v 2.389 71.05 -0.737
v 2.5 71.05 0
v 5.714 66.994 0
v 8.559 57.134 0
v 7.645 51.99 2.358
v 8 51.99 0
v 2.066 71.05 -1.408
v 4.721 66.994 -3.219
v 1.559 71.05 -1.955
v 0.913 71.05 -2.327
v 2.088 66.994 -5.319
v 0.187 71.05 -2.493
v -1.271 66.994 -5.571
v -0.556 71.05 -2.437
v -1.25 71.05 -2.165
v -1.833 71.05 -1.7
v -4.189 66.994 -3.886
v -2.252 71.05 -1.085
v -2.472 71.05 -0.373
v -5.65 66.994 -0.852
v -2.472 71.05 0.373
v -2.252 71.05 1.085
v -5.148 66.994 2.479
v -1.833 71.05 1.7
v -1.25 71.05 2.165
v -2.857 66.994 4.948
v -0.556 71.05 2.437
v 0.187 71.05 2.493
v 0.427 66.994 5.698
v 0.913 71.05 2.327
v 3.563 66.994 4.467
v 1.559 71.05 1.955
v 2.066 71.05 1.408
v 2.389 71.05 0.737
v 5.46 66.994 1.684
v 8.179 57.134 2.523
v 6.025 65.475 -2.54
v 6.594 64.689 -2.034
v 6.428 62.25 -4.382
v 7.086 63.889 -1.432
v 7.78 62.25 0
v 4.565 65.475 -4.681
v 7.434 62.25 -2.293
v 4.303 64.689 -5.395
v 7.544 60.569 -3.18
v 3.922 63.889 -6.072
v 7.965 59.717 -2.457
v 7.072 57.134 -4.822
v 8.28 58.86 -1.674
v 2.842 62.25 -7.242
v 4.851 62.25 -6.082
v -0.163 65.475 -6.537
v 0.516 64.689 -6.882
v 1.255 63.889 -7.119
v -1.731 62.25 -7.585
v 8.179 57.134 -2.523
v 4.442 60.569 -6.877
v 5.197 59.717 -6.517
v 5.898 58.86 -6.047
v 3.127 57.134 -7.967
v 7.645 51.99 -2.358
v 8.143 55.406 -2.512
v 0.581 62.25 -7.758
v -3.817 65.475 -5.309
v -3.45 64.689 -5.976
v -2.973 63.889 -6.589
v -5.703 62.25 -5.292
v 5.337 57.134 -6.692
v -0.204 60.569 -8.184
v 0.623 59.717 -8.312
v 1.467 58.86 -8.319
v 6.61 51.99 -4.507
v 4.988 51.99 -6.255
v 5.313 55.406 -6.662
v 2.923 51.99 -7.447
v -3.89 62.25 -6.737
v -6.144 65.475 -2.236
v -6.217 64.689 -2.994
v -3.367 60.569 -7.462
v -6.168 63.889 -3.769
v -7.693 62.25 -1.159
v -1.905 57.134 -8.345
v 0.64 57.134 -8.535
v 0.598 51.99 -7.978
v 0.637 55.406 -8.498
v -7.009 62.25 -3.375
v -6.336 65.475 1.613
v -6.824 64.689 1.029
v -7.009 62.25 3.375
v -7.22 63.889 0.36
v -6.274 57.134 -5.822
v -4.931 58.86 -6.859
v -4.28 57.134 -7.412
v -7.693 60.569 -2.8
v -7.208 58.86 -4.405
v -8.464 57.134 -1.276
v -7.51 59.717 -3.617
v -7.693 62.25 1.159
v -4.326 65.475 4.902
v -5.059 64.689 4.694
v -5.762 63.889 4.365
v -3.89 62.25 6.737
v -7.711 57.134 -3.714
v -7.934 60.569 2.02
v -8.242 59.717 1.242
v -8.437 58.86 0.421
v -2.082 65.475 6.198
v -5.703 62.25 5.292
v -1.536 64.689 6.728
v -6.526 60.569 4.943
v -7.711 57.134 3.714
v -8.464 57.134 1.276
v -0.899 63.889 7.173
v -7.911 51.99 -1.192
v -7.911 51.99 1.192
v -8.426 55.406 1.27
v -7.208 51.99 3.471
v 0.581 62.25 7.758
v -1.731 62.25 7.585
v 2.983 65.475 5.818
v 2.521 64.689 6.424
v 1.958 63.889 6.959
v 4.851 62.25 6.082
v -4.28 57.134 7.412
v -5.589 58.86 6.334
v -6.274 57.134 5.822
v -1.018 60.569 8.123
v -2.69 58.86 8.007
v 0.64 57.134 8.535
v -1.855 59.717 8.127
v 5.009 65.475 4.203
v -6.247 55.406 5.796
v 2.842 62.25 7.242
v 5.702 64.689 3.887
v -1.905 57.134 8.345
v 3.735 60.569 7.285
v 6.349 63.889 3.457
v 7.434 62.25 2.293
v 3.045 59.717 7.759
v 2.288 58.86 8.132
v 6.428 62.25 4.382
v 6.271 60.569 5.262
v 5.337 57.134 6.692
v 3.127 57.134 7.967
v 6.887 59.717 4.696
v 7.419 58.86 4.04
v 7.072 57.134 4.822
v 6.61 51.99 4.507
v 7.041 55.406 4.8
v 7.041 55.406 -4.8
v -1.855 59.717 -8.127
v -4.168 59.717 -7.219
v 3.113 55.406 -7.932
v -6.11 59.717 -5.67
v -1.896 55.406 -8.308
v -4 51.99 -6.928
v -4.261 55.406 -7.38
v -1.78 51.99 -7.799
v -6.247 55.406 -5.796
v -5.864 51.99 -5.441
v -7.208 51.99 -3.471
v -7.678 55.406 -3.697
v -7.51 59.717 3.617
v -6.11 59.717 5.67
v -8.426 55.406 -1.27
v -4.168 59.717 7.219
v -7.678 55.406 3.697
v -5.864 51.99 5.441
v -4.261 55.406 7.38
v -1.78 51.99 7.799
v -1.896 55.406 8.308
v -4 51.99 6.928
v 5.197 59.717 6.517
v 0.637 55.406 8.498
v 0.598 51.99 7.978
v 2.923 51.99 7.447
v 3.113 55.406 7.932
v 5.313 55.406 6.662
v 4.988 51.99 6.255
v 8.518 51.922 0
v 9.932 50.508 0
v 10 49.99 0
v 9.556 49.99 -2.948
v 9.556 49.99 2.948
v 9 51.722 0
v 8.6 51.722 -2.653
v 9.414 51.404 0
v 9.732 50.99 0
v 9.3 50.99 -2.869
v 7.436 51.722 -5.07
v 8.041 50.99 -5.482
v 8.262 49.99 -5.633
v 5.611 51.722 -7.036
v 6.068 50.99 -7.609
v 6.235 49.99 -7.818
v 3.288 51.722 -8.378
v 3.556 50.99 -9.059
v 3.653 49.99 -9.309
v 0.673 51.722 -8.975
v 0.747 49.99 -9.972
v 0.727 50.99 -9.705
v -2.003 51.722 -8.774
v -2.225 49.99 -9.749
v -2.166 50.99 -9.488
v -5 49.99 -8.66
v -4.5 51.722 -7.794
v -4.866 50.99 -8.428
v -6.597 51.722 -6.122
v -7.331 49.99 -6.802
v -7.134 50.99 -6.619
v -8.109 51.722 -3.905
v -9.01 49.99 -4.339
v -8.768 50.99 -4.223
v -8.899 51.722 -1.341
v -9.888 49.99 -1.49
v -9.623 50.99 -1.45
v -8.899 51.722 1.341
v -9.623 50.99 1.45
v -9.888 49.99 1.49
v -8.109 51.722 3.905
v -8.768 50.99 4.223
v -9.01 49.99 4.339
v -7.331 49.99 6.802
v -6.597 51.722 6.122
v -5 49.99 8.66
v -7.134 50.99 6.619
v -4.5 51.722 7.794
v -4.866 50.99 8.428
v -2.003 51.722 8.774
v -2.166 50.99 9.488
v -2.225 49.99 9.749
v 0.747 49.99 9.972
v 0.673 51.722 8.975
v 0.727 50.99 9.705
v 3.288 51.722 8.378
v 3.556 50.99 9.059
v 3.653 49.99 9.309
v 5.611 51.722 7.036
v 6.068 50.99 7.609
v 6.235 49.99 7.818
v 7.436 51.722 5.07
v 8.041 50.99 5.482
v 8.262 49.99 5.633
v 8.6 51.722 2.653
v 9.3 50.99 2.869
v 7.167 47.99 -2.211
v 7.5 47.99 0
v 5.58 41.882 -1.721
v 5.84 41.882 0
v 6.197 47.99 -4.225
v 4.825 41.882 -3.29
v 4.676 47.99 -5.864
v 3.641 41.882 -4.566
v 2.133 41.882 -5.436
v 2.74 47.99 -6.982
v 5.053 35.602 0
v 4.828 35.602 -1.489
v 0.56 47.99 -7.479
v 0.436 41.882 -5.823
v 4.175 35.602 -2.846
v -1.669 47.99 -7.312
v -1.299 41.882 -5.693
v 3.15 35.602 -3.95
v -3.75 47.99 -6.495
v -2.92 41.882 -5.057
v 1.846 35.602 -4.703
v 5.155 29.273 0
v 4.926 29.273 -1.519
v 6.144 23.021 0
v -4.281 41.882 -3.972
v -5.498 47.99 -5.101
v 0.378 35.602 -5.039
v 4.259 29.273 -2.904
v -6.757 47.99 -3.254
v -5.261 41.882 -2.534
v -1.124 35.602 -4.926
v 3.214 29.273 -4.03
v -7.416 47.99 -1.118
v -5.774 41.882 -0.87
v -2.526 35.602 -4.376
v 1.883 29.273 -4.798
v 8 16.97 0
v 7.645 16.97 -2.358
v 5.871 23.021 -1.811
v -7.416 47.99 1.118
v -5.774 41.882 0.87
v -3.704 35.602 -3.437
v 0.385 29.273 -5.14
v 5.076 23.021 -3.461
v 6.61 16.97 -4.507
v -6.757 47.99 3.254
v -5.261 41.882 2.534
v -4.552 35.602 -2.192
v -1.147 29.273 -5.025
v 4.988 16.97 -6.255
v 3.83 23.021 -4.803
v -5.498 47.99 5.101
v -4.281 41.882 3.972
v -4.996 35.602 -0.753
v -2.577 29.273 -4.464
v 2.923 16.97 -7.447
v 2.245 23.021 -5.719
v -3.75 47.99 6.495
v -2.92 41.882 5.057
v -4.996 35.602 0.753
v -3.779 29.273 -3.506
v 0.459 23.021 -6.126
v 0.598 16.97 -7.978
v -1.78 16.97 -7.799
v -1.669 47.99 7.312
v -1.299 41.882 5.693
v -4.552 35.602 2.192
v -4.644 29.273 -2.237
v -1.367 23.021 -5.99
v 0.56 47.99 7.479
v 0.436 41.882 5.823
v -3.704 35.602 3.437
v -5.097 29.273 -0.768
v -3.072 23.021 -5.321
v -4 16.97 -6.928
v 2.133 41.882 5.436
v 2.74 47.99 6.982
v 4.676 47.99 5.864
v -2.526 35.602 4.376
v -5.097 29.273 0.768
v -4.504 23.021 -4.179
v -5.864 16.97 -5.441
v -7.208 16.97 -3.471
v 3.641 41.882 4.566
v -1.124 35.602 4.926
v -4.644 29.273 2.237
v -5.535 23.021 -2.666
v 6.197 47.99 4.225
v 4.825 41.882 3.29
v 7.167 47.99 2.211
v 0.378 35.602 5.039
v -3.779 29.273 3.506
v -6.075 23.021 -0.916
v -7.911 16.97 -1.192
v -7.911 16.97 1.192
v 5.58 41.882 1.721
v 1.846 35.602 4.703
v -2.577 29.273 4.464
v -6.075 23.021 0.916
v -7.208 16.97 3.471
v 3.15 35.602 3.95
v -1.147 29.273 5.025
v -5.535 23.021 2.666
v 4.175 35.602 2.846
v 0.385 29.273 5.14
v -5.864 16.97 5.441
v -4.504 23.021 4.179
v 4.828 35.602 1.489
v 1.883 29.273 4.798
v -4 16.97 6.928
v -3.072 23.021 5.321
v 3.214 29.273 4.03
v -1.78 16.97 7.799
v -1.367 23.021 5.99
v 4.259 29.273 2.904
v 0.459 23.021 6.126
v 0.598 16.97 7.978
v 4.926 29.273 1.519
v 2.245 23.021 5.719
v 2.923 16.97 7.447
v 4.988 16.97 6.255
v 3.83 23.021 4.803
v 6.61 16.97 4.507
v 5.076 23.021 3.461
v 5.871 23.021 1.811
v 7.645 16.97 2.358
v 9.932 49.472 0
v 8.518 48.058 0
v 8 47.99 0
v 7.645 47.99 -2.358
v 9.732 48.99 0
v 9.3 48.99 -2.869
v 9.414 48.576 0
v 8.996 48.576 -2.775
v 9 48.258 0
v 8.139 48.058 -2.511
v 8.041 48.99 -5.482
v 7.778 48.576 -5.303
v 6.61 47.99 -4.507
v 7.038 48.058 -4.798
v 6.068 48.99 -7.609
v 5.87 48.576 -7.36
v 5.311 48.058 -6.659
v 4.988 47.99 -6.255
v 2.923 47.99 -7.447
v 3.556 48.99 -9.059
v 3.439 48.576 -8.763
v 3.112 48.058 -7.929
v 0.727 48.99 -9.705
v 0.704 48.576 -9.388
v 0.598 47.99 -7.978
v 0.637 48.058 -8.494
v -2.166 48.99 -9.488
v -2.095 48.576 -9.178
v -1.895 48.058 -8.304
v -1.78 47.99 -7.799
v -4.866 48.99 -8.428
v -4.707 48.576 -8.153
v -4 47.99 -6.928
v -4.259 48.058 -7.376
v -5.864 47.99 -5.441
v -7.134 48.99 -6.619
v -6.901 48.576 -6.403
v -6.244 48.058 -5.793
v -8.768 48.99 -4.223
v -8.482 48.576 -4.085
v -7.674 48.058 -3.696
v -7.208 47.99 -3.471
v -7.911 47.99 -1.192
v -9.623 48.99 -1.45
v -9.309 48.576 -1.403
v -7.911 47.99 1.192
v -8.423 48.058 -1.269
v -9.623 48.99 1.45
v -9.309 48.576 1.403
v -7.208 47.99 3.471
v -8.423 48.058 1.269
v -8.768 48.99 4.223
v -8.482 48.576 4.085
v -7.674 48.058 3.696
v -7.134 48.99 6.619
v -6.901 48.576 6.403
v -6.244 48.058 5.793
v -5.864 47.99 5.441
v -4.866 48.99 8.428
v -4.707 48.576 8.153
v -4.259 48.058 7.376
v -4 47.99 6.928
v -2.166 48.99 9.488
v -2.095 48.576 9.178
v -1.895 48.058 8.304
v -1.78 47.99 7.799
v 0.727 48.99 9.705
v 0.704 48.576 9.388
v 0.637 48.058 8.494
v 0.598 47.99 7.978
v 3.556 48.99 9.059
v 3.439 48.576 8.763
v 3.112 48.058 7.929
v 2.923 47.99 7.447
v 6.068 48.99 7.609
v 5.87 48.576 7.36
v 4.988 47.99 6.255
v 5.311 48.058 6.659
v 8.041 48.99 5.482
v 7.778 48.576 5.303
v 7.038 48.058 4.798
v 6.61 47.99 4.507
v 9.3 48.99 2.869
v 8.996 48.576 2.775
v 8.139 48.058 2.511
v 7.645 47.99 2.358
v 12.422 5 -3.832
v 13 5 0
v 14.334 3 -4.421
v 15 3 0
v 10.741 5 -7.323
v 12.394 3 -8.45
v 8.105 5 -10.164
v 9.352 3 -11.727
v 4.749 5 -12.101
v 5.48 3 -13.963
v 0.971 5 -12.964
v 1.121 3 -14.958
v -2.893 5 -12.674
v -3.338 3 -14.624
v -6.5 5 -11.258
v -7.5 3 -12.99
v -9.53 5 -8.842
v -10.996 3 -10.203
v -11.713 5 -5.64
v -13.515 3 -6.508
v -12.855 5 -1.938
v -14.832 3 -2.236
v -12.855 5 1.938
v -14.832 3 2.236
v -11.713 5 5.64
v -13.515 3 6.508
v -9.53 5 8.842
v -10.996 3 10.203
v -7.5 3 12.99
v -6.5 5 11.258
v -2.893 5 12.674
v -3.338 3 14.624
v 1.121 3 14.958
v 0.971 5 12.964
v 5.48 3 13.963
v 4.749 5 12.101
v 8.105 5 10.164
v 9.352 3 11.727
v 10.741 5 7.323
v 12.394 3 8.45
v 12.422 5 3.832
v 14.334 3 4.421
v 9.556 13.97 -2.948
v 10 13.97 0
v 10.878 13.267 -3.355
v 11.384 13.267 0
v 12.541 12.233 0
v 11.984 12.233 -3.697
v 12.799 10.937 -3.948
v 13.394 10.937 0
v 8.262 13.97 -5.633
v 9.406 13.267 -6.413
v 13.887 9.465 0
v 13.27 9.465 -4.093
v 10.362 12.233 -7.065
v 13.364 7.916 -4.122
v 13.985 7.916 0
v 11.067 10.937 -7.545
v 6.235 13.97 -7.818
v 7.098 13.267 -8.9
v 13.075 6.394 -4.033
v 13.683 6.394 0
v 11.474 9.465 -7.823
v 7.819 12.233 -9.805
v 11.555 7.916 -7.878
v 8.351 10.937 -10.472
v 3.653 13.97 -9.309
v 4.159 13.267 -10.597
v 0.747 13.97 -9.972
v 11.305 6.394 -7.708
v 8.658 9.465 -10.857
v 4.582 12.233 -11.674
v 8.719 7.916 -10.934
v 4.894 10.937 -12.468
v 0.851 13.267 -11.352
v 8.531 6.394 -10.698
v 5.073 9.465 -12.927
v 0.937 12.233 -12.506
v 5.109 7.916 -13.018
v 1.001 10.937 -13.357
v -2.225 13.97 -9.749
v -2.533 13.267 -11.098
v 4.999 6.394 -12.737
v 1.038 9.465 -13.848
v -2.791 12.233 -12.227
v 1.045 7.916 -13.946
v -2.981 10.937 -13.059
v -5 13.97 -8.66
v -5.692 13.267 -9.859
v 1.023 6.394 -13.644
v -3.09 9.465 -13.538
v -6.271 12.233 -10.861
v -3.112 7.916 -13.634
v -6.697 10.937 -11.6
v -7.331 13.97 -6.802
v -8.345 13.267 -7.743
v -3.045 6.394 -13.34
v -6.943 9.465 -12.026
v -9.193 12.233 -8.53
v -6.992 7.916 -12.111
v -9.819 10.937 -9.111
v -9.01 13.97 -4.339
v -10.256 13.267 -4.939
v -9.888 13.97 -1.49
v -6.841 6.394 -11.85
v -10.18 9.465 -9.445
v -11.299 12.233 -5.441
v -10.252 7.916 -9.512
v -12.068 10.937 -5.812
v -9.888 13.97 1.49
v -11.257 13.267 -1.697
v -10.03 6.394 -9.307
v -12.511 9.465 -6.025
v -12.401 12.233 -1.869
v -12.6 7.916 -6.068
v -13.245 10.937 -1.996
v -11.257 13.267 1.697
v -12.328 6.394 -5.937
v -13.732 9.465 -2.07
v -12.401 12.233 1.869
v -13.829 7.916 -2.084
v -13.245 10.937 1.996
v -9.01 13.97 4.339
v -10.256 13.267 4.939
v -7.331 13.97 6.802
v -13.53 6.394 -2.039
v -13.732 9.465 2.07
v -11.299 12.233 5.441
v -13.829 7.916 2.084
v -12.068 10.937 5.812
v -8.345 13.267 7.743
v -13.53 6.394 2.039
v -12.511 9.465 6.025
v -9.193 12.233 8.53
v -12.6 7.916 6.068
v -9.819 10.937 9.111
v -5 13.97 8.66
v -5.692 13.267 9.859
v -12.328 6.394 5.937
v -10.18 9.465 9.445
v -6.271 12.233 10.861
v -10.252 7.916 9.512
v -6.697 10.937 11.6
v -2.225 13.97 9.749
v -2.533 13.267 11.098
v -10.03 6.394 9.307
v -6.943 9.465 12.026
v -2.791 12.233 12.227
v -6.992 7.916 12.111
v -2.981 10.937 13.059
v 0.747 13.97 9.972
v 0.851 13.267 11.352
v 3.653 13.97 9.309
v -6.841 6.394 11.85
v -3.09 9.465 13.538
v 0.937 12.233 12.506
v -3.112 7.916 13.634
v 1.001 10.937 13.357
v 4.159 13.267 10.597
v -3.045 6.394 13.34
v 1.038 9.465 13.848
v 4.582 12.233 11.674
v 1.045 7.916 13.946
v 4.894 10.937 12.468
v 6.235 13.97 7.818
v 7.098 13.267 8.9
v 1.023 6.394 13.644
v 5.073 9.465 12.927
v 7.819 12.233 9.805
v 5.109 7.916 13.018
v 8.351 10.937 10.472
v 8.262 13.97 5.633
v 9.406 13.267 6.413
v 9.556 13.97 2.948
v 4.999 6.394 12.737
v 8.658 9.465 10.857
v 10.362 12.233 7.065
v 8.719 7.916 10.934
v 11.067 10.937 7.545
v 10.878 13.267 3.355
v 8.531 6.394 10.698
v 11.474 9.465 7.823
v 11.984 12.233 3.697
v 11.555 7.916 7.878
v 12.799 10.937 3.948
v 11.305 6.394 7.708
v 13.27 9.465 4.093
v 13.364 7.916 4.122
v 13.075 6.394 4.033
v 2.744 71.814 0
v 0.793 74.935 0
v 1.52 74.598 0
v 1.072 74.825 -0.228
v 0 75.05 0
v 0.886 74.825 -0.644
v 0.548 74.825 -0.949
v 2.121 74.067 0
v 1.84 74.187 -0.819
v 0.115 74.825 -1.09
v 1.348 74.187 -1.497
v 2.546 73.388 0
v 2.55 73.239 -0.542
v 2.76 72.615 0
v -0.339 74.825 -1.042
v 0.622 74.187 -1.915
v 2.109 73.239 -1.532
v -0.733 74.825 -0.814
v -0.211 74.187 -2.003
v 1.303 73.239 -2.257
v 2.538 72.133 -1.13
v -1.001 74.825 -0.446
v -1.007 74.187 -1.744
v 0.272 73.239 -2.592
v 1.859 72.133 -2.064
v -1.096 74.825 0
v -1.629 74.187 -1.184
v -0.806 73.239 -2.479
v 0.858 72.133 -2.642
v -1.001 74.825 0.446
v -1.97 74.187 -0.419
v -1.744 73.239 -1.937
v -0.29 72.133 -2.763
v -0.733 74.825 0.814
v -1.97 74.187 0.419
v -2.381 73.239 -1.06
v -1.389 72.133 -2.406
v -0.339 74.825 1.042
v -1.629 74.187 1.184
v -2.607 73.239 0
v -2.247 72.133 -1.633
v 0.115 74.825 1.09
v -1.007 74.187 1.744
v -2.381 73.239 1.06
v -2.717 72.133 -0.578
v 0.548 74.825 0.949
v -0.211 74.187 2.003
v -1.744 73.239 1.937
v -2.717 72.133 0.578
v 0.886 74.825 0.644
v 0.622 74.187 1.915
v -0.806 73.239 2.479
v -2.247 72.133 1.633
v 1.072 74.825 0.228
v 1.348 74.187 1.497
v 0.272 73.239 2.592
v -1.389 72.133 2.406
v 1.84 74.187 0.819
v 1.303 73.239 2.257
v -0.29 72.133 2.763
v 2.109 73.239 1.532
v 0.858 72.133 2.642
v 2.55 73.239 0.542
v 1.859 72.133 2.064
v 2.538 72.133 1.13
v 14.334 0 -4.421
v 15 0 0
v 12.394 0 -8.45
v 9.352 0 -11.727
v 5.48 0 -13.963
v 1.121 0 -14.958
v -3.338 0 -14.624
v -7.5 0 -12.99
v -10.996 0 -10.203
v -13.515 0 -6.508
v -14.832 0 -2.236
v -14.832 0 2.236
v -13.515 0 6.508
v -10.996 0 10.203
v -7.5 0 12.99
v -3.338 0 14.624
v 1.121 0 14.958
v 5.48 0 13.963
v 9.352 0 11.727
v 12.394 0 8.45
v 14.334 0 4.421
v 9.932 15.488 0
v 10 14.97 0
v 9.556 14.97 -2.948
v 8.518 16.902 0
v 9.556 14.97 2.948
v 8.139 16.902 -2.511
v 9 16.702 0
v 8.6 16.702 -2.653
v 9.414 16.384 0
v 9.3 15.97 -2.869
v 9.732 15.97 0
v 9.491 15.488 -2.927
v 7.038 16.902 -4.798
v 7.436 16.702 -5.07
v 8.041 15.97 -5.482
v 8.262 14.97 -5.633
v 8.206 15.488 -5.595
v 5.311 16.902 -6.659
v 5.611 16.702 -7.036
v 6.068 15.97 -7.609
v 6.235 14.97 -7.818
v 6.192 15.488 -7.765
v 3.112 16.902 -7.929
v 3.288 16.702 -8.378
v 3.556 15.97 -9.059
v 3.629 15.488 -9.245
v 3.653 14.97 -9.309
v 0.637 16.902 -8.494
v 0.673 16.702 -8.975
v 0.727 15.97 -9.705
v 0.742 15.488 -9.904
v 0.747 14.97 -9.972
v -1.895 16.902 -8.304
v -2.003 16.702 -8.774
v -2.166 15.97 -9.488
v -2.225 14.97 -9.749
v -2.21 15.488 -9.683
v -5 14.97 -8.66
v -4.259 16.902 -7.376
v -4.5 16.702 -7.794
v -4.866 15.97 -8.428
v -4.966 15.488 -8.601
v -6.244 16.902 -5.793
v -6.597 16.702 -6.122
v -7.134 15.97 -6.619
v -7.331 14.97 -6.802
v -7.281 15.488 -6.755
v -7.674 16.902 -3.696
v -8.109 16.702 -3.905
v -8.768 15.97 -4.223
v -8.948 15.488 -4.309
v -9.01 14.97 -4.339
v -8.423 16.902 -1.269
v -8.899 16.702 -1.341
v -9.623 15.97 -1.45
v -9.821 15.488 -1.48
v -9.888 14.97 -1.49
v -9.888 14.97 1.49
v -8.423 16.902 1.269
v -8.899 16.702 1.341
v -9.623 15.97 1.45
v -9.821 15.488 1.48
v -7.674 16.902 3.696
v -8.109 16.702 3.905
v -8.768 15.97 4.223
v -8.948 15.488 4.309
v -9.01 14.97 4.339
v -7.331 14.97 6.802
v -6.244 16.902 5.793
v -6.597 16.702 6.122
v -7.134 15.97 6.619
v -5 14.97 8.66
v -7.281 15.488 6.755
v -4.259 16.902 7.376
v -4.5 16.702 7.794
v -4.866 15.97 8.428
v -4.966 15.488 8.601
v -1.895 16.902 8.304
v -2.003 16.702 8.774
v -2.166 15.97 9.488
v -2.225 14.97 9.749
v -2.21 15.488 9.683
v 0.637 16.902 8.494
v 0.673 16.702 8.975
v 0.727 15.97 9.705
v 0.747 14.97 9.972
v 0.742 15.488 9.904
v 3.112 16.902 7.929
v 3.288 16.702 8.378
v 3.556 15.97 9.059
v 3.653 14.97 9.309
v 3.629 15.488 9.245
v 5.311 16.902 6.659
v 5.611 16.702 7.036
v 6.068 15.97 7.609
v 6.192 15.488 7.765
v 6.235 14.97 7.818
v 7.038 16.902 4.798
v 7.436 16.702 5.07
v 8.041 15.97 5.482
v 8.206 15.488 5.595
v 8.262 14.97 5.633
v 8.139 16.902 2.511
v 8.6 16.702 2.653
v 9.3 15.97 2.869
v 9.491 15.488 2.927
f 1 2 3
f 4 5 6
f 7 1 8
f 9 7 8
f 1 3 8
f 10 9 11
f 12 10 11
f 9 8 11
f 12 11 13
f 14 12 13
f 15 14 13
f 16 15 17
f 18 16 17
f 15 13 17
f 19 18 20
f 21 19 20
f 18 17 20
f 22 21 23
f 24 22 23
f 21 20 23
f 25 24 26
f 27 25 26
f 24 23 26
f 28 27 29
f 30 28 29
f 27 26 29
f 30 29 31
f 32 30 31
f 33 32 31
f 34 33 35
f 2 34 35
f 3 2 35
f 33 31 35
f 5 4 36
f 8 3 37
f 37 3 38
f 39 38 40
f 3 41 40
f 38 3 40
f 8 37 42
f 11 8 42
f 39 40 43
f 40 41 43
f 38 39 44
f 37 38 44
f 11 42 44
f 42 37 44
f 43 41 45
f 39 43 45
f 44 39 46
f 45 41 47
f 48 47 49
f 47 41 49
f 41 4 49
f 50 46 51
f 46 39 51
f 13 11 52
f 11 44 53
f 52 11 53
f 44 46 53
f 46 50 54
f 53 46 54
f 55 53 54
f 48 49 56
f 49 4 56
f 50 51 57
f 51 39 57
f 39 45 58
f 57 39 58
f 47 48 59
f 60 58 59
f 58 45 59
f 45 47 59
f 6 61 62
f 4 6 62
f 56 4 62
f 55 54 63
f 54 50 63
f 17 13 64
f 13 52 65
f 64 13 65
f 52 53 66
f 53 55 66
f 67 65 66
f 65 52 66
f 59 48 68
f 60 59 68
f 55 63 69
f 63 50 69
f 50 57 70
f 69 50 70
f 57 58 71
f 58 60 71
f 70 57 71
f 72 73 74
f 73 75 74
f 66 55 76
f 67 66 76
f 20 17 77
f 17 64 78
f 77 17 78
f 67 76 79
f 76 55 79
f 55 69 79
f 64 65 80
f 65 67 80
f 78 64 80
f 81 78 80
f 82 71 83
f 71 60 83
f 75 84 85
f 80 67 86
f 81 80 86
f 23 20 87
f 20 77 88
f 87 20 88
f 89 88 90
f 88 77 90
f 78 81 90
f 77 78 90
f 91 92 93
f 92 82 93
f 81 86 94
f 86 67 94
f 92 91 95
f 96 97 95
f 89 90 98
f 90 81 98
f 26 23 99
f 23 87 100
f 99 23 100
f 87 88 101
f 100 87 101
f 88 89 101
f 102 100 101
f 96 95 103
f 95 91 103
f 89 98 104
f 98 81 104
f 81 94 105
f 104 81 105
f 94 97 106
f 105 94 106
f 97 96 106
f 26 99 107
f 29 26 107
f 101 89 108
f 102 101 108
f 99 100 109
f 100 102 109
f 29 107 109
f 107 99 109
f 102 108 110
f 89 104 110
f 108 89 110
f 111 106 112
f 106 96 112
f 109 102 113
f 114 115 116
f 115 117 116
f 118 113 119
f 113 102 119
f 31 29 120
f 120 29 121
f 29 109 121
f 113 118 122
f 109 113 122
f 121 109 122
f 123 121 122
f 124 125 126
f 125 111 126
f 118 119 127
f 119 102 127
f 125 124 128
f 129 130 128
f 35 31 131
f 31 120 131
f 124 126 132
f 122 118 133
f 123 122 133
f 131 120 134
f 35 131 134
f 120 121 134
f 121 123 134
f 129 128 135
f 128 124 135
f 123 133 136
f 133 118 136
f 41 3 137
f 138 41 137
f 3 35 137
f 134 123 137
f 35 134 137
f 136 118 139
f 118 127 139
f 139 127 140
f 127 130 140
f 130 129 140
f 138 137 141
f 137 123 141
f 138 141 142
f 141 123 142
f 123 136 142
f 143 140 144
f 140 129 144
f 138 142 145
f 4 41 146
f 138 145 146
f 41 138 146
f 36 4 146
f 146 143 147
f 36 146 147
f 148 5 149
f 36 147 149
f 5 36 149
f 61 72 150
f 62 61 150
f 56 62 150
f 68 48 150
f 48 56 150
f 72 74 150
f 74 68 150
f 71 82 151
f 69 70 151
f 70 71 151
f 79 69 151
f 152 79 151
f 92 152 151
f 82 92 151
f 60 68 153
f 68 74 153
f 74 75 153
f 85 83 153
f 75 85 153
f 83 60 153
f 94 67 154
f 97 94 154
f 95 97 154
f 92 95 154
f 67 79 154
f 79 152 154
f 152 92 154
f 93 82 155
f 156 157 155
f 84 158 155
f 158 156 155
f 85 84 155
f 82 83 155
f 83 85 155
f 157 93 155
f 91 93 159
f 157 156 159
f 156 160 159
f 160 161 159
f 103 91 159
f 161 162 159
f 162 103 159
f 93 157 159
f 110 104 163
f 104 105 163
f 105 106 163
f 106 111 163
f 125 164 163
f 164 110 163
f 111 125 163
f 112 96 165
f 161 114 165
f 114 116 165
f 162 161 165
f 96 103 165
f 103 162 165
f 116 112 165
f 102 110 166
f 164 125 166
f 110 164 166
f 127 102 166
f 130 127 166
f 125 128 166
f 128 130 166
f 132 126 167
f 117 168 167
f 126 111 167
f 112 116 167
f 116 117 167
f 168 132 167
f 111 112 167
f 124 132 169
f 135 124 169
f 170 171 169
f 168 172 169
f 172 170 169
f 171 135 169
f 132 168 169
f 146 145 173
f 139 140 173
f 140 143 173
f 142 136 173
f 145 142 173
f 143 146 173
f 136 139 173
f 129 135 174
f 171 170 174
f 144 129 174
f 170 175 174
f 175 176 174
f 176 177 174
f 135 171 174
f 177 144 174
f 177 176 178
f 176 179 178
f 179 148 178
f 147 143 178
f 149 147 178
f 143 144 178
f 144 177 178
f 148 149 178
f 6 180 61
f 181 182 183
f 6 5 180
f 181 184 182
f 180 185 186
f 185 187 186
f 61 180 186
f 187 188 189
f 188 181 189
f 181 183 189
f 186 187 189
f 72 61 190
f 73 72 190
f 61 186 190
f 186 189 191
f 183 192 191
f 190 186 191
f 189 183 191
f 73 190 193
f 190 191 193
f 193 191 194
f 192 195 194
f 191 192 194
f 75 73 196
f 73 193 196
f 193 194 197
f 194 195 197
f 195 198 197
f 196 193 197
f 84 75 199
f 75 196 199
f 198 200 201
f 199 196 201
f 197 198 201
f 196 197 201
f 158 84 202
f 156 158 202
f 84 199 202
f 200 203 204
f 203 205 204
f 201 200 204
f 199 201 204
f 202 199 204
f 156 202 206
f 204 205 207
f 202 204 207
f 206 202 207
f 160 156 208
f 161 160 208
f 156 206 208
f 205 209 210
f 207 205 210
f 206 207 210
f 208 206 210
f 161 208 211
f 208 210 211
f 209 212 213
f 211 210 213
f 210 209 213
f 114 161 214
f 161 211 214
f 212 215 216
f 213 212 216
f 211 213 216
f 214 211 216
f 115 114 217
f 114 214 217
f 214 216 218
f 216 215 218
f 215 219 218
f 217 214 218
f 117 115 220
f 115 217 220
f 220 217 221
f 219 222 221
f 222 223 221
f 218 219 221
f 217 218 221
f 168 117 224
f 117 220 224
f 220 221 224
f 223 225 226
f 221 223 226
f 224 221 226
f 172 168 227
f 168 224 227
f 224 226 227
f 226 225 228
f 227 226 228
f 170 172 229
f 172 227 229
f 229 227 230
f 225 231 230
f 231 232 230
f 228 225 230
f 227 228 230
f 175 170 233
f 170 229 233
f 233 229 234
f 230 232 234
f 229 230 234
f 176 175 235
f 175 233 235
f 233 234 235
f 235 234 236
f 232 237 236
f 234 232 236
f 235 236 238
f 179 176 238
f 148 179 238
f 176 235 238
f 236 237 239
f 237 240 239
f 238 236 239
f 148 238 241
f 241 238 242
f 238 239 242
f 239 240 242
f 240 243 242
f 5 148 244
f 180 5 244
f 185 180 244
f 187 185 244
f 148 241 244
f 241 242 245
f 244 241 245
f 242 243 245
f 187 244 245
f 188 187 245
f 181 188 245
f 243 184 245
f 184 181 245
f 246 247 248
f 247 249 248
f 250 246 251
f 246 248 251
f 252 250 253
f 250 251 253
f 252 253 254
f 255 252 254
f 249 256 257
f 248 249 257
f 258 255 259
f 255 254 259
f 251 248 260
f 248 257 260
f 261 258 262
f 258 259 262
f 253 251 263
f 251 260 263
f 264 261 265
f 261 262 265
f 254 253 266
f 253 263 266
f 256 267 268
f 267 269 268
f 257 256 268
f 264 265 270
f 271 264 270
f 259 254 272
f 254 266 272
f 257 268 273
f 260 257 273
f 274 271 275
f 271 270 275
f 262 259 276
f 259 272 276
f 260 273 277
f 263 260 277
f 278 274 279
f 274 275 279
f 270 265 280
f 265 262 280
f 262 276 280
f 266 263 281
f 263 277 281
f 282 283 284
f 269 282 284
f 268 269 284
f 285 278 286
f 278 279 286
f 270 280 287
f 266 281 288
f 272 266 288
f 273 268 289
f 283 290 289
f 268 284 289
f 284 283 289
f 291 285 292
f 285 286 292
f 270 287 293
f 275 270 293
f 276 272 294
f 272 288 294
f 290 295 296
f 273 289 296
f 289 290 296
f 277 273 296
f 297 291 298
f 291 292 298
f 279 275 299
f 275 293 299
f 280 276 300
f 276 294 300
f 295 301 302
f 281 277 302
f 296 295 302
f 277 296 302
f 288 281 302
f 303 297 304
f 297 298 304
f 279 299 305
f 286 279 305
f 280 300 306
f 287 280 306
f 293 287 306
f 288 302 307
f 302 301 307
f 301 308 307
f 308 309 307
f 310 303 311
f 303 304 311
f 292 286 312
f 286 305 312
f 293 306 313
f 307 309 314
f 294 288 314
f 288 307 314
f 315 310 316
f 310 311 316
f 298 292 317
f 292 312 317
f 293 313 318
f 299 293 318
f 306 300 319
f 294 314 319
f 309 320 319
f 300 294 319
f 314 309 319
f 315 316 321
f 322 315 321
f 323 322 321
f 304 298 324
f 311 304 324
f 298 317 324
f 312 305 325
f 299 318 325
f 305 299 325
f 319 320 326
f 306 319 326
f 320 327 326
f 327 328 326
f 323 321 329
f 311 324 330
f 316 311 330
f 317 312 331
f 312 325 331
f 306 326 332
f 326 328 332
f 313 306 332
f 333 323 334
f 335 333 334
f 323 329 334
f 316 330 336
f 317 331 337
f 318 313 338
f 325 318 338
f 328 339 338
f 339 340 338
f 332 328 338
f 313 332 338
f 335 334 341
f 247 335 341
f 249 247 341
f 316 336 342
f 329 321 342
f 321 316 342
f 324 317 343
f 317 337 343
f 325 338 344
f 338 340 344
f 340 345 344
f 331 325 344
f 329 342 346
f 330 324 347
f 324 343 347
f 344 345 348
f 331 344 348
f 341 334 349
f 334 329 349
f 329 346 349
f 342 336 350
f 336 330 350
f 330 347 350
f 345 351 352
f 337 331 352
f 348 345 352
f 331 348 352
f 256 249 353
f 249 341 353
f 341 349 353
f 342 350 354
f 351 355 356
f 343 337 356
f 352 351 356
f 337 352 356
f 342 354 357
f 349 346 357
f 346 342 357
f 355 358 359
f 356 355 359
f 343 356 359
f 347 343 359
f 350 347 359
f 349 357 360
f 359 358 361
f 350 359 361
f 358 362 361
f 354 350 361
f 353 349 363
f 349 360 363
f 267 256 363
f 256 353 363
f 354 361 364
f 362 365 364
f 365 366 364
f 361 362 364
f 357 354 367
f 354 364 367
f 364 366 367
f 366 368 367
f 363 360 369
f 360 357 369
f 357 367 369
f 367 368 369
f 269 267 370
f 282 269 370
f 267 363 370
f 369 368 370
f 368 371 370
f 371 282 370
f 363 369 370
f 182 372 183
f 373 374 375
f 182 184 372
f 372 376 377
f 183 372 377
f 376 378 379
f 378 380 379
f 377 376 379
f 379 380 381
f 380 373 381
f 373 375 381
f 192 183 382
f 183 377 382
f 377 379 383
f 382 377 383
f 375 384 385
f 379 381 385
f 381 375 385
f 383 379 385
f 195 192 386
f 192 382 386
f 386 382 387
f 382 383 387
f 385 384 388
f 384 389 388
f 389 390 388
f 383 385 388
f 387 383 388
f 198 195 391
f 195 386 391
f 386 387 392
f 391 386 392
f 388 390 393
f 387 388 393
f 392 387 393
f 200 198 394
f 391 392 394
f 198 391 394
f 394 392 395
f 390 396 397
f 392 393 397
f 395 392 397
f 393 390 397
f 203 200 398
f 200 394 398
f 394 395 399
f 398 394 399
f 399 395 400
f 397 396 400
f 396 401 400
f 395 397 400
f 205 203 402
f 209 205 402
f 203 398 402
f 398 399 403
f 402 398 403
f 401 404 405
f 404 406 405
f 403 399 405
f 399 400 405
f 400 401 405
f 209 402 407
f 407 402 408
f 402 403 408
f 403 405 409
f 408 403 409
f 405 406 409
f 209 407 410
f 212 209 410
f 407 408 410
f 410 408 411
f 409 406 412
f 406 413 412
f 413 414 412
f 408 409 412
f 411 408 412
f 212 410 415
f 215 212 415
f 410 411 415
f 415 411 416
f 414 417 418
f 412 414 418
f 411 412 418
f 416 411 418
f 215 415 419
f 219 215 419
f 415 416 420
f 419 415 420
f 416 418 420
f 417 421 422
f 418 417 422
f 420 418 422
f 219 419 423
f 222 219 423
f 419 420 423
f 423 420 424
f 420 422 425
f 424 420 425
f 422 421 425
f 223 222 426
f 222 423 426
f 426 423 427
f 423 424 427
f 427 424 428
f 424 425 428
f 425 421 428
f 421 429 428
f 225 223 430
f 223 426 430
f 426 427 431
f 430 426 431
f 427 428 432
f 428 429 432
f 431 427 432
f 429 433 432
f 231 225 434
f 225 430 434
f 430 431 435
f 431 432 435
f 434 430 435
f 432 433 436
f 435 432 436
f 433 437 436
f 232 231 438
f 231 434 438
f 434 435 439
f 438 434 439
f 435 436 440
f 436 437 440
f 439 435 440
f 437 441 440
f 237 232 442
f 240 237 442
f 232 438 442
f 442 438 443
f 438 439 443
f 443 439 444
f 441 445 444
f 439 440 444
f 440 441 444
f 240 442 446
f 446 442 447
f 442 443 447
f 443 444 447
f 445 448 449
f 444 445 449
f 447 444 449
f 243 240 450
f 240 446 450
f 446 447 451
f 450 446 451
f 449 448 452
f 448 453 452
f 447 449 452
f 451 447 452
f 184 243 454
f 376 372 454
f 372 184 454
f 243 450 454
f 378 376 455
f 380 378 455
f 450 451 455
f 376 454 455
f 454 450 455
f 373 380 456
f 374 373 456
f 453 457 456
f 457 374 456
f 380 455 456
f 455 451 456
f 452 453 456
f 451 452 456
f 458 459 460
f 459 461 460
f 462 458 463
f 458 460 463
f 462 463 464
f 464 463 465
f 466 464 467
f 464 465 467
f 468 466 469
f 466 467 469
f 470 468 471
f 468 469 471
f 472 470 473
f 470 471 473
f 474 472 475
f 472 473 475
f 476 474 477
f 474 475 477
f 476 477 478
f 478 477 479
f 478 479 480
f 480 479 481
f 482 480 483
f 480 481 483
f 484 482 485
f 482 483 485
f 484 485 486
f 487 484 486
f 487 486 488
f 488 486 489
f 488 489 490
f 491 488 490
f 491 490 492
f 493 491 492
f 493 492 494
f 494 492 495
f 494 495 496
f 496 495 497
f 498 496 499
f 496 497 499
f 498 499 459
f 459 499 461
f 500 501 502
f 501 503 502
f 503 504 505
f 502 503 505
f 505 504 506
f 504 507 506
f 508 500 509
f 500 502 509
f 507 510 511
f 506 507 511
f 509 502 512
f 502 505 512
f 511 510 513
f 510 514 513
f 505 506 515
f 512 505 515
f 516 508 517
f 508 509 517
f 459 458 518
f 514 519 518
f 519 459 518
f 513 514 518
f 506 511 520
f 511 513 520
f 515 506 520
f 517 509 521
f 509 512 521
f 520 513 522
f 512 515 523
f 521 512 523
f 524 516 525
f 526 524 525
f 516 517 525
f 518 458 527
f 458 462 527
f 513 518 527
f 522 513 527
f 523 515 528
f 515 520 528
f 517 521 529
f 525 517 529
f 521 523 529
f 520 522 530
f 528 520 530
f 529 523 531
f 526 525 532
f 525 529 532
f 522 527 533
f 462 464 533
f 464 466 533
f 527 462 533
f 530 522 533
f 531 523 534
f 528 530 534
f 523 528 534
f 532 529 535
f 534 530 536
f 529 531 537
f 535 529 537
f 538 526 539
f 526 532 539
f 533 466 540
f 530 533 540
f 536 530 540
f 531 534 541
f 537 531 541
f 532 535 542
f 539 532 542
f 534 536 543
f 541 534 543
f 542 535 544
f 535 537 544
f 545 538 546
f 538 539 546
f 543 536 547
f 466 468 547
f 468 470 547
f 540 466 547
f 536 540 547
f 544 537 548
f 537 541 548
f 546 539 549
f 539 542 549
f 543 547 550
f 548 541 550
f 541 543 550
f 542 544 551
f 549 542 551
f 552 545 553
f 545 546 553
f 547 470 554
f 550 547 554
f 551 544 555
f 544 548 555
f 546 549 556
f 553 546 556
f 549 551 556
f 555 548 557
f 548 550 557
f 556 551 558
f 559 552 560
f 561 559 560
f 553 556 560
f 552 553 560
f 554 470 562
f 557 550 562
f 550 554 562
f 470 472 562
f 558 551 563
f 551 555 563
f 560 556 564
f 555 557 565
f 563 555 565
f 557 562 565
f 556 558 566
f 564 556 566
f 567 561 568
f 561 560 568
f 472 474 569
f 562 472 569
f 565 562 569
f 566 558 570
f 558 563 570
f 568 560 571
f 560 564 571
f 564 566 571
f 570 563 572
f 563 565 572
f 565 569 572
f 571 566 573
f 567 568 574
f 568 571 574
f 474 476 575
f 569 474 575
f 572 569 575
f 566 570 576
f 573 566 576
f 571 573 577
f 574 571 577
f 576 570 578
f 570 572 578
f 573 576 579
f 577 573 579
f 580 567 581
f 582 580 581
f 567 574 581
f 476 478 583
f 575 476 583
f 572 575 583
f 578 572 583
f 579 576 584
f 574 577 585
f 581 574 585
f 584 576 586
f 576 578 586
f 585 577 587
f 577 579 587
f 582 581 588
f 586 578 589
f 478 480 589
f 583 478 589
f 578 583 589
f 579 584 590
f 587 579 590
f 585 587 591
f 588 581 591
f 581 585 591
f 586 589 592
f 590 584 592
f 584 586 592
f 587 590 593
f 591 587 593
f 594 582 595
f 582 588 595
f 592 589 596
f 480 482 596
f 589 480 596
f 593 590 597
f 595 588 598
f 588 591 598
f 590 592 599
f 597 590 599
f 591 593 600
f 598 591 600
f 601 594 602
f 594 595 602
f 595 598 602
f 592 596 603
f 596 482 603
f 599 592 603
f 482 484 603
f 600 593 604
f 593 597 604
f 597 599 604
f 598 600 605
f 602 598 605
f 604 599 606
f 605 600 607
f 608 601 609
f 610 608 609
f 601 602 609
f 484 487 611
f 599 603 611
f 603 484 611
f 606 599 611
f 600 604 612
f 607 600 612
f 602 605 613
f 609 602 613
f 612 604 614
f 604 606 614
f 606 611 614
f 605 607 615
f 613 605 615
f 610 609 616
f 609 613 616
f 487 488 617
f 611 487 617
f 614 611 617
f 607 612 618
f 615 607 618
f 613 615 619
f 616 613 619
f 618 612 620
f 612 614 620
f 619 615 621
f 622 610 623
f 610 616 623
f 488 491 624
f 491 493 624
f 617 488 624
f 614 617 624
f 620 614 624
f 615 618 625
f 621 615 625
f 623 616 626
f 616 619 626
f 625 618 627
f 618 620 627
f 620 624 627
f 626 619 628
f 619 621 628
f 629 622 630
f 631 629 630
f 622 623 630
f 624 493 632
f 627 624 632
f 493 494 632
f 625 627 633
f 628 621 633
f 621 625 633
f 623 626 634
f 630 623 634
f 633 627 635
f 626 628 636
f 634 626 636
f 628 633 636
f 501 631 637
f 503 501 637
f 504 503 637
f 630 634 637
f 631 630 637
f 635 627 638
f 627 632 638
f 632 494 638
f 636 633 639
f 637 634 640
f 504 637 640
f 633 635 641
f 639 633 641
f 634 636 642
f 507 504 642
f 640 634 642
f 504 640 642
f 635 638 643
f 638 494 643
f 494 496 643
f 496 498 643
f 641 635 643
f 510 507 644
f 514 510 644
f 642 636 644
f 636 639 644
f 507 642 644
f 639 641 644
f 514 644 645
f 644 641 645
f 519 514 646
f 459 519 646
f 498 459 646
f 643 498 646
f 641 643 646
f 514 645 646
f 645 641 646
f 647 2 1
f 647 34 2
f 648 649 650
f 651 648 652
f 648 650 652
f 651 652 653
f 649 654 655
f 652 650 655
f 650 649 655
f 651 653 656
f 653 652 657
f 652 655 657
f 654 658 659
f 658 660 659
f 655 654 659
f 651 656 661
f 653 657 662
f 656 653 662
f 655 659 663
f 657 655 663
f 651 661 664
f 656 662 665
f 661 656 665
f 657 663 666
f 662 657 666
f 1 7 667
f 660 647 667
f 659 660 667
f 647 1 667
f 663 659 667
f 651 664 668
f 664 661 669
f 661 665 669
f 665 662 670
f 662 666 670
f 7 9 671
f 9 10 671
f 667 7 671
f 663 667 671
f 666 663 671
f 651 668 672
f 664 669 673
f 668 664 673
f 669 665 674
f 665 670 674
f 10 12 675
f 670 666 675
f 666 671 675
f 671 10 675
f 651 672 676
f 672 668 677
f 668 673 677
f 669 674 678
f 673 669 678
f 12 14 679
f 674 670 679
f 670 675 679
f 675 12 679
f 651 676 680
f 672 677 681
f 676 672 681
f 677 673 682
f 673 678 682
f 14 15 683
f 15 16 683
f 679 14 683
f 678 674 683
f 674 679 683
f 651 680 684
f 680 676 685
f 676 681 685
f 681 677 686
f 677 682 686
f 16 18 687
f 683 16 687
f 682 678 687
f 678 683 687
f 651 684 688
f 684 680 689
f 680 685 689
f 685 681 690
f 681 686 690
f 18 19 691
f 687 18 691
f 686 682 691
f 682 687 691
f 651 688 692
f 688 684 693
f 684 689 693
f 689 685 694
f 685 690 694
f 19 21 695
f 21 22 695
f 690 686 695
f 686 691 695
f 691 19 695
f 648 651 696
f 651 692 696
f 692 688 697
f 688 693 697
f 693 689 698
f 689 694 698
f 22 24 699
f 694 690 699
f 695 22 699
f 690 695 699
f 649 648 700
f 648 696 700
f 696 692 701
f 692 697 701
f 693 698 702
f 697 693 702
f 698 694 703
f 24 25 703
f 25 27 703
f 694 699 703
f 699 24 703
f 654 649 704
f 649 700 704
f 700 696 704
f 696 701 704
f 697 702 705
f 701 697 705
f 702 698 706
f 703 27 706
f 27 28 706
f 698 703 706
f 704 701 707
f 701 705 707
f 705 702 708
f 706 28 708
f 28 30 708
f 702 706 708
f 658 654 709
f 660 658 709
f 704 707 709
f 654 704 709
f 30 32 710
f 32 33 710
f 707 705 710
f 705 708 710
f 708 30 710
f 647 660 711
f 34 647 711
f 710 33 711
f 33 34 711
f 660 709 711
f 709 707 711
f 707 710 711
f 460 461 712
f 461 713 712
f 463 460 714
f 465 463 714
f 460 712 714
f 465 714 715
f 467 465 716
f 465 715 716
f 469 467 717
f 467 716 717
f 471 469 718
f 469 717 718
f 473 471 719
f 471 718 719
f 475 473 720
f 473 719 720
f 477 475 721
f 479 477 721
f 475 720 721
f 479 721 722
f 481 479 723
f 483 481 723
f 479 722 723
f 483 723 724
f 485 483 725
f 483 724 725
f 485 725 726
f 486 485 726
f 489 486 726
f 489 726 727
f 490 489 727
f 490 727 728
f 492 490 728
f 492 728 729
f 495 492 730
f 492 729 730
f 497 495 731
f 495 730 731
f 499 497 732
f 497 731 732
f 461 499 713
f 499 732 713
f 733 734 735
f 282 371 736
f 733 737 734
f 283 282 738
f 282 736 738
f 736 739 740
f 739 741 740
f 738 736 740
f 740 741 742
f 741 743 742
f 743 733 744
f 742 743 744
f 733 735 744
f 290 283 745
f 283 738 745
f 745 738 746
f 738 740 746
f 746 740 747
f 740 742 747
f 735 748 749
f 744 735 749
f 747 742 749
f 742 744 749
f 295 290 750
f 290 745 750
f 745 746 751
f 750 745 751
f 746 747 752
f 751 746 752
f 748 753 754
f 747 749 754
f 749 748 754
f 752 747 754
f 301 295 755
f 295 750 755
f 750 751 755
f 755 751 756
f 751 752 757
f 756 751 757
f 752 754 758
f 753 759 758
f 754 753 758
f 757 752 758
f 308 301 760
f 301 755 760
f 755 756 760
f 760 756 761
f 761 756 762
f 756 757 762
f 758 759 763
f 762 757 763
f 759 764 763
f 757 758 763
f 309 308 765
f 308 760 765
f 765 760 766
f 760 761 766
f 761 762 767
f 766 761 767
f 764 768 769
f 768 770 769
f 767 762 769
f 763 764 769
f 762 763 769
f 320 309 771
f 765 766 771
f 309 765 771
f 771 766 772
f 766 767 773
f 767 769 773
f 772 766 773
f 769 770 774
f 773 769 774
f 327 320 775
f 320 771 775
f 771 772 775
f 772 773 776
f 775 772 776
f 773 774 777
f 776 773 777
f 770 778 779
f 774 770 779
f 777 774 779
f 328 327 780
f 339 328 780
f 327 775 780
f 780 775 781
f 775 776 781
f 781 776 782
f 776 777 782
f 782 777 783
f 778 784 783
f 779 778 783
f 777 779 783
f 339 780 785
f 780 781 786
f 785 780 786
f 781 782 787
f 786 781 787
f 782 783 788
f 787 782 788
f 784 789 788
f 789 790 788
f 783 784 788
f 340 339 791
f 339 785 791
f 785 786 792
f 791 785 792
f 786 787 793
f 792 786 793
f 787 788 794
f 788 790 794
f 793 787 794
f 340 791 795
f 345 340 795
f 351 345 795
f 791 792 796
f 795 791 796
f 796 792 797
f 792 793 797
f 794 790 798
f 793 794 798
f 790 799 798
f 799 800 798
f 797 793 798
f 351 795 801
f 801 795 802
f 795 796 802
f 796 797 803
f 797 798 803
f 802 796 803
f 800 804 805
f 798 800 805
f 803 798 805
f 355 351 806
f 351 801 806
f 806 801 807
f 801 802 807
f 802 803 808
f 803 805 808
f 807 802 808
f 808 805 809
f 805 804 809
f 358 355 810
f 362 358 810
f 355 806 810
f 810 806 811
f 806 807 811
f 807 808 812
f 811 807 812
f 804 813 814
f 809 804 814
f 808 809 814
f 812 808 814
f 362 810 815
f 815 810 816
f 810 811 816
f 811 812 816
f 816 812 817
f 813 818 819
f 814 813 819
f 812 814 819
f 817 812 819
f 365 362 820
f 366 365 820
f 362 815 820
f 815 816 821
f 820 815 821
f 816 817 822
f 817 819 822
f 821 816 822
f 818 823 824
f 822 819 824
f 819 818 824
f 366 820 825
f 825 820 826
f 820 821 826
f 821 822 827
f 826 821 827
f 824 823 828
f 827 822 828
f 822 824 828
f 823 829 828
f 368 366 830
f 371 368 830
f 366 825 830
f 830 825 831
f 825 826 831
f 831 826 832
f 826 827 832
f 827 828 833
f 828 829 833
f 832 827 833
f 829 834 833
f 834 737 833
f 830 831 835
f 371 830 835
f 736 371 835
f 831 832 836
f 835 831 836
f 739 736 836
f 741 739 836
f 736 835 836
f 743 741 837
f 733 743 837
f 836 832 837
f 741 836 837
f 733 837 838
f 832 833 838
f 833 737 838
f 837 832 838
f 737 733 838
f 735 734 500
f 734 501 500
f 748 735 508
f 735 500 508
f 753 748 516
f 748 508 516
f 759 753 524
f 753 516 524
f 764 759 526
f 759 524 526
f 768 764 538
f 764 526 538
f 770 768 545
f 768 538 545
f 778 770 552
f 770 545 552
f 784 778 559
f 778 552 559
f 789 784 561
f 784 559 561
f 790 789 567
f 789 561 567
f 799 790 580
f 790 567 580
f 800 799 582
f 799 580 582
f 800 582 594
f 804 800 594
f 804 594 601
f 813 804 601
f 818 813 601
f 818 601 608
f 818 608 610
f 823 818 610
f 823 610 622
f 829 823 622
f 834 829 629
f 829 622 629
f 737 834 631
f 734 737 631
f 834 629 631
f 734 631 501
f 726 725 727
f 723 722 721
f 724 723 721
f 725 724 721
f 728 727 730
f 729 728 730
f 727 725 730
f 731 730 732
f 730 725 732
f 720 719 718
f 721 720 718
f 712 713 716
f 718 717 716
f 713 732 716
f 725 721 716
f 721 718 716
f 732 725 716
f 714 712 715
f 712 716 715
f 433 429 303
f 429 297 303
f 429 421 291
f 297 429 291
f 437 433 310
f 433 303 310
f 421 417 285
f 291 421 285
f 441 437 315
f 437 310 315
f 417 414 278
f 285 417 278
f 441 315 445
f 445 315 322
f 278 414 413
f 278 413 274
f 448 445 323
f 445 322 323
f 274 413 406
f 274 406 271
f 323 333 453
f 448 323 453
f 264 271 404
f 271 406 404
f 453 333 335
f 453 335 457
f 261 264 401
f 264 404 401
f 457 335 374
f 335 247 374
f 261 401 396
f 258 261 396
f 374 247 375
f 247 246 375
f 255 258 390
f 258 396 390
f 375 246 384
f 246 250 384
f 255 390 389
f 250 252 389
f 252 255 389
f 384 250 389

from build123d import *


with BuildPart() as part:
    # Sketch1 → Revolve1 (revolve)
    with BuildSketch(Plane.XY, mode=Mode.PRIVATE) as revolve1_sk:
        with BuildLine():
            Line((-15, 0), (0, 0))
            Line((0, 0), (0, 71.05))
            Line((0, 71.05), (-2.5, 71.05))
            ThreePointArc((-2.5, 71.05), (-7.779672348, 62.249968411), (-8, 51.99))
            ThreePointArc((-8, 51.99), (-9.414213562, 51.404213562), (-10, 49.99))
            ThreePointArc((-10, 49.99), (-9.414213562, 48.575786438), (-8, 47.99))
            Line((-8, 47.99), (-7.5, 47.99))
            ThreePointArc((-7.5, 47.99), (-4.992249752, 32.435548835), (-8, 16.97))
            ThreePointArc((-8, 16.97), (-9.414213562, 16.384213562), (-10, 14.97))
            Line((-10, 14.97), (-10, 13.97))
            ThreePointArc((-10, 13.97), (-13.688325627, 10.216881481), (-13, 5))
            Line((-13, 5), (-15, 3))
            Line((-15, 3), (-15, 0))
        make_face()
        with BuildLine():
            Line((-2.5, 71.05), (0, 71.05))
            Line((0, 71.05), (0, 75.05))
            ThreePointArc((0, 75.05), (-2.358495283, 73.742809552), (-2.5, 71.05))
        make_face()
    revolve(revolve1_sk.sketch.rotate(Axis((0, -540.323818274, 0), (0, 1, 0)), 180), axis=Axis((0, -540.323818274, 0), (0, 1, 0)))


solid = part.part
